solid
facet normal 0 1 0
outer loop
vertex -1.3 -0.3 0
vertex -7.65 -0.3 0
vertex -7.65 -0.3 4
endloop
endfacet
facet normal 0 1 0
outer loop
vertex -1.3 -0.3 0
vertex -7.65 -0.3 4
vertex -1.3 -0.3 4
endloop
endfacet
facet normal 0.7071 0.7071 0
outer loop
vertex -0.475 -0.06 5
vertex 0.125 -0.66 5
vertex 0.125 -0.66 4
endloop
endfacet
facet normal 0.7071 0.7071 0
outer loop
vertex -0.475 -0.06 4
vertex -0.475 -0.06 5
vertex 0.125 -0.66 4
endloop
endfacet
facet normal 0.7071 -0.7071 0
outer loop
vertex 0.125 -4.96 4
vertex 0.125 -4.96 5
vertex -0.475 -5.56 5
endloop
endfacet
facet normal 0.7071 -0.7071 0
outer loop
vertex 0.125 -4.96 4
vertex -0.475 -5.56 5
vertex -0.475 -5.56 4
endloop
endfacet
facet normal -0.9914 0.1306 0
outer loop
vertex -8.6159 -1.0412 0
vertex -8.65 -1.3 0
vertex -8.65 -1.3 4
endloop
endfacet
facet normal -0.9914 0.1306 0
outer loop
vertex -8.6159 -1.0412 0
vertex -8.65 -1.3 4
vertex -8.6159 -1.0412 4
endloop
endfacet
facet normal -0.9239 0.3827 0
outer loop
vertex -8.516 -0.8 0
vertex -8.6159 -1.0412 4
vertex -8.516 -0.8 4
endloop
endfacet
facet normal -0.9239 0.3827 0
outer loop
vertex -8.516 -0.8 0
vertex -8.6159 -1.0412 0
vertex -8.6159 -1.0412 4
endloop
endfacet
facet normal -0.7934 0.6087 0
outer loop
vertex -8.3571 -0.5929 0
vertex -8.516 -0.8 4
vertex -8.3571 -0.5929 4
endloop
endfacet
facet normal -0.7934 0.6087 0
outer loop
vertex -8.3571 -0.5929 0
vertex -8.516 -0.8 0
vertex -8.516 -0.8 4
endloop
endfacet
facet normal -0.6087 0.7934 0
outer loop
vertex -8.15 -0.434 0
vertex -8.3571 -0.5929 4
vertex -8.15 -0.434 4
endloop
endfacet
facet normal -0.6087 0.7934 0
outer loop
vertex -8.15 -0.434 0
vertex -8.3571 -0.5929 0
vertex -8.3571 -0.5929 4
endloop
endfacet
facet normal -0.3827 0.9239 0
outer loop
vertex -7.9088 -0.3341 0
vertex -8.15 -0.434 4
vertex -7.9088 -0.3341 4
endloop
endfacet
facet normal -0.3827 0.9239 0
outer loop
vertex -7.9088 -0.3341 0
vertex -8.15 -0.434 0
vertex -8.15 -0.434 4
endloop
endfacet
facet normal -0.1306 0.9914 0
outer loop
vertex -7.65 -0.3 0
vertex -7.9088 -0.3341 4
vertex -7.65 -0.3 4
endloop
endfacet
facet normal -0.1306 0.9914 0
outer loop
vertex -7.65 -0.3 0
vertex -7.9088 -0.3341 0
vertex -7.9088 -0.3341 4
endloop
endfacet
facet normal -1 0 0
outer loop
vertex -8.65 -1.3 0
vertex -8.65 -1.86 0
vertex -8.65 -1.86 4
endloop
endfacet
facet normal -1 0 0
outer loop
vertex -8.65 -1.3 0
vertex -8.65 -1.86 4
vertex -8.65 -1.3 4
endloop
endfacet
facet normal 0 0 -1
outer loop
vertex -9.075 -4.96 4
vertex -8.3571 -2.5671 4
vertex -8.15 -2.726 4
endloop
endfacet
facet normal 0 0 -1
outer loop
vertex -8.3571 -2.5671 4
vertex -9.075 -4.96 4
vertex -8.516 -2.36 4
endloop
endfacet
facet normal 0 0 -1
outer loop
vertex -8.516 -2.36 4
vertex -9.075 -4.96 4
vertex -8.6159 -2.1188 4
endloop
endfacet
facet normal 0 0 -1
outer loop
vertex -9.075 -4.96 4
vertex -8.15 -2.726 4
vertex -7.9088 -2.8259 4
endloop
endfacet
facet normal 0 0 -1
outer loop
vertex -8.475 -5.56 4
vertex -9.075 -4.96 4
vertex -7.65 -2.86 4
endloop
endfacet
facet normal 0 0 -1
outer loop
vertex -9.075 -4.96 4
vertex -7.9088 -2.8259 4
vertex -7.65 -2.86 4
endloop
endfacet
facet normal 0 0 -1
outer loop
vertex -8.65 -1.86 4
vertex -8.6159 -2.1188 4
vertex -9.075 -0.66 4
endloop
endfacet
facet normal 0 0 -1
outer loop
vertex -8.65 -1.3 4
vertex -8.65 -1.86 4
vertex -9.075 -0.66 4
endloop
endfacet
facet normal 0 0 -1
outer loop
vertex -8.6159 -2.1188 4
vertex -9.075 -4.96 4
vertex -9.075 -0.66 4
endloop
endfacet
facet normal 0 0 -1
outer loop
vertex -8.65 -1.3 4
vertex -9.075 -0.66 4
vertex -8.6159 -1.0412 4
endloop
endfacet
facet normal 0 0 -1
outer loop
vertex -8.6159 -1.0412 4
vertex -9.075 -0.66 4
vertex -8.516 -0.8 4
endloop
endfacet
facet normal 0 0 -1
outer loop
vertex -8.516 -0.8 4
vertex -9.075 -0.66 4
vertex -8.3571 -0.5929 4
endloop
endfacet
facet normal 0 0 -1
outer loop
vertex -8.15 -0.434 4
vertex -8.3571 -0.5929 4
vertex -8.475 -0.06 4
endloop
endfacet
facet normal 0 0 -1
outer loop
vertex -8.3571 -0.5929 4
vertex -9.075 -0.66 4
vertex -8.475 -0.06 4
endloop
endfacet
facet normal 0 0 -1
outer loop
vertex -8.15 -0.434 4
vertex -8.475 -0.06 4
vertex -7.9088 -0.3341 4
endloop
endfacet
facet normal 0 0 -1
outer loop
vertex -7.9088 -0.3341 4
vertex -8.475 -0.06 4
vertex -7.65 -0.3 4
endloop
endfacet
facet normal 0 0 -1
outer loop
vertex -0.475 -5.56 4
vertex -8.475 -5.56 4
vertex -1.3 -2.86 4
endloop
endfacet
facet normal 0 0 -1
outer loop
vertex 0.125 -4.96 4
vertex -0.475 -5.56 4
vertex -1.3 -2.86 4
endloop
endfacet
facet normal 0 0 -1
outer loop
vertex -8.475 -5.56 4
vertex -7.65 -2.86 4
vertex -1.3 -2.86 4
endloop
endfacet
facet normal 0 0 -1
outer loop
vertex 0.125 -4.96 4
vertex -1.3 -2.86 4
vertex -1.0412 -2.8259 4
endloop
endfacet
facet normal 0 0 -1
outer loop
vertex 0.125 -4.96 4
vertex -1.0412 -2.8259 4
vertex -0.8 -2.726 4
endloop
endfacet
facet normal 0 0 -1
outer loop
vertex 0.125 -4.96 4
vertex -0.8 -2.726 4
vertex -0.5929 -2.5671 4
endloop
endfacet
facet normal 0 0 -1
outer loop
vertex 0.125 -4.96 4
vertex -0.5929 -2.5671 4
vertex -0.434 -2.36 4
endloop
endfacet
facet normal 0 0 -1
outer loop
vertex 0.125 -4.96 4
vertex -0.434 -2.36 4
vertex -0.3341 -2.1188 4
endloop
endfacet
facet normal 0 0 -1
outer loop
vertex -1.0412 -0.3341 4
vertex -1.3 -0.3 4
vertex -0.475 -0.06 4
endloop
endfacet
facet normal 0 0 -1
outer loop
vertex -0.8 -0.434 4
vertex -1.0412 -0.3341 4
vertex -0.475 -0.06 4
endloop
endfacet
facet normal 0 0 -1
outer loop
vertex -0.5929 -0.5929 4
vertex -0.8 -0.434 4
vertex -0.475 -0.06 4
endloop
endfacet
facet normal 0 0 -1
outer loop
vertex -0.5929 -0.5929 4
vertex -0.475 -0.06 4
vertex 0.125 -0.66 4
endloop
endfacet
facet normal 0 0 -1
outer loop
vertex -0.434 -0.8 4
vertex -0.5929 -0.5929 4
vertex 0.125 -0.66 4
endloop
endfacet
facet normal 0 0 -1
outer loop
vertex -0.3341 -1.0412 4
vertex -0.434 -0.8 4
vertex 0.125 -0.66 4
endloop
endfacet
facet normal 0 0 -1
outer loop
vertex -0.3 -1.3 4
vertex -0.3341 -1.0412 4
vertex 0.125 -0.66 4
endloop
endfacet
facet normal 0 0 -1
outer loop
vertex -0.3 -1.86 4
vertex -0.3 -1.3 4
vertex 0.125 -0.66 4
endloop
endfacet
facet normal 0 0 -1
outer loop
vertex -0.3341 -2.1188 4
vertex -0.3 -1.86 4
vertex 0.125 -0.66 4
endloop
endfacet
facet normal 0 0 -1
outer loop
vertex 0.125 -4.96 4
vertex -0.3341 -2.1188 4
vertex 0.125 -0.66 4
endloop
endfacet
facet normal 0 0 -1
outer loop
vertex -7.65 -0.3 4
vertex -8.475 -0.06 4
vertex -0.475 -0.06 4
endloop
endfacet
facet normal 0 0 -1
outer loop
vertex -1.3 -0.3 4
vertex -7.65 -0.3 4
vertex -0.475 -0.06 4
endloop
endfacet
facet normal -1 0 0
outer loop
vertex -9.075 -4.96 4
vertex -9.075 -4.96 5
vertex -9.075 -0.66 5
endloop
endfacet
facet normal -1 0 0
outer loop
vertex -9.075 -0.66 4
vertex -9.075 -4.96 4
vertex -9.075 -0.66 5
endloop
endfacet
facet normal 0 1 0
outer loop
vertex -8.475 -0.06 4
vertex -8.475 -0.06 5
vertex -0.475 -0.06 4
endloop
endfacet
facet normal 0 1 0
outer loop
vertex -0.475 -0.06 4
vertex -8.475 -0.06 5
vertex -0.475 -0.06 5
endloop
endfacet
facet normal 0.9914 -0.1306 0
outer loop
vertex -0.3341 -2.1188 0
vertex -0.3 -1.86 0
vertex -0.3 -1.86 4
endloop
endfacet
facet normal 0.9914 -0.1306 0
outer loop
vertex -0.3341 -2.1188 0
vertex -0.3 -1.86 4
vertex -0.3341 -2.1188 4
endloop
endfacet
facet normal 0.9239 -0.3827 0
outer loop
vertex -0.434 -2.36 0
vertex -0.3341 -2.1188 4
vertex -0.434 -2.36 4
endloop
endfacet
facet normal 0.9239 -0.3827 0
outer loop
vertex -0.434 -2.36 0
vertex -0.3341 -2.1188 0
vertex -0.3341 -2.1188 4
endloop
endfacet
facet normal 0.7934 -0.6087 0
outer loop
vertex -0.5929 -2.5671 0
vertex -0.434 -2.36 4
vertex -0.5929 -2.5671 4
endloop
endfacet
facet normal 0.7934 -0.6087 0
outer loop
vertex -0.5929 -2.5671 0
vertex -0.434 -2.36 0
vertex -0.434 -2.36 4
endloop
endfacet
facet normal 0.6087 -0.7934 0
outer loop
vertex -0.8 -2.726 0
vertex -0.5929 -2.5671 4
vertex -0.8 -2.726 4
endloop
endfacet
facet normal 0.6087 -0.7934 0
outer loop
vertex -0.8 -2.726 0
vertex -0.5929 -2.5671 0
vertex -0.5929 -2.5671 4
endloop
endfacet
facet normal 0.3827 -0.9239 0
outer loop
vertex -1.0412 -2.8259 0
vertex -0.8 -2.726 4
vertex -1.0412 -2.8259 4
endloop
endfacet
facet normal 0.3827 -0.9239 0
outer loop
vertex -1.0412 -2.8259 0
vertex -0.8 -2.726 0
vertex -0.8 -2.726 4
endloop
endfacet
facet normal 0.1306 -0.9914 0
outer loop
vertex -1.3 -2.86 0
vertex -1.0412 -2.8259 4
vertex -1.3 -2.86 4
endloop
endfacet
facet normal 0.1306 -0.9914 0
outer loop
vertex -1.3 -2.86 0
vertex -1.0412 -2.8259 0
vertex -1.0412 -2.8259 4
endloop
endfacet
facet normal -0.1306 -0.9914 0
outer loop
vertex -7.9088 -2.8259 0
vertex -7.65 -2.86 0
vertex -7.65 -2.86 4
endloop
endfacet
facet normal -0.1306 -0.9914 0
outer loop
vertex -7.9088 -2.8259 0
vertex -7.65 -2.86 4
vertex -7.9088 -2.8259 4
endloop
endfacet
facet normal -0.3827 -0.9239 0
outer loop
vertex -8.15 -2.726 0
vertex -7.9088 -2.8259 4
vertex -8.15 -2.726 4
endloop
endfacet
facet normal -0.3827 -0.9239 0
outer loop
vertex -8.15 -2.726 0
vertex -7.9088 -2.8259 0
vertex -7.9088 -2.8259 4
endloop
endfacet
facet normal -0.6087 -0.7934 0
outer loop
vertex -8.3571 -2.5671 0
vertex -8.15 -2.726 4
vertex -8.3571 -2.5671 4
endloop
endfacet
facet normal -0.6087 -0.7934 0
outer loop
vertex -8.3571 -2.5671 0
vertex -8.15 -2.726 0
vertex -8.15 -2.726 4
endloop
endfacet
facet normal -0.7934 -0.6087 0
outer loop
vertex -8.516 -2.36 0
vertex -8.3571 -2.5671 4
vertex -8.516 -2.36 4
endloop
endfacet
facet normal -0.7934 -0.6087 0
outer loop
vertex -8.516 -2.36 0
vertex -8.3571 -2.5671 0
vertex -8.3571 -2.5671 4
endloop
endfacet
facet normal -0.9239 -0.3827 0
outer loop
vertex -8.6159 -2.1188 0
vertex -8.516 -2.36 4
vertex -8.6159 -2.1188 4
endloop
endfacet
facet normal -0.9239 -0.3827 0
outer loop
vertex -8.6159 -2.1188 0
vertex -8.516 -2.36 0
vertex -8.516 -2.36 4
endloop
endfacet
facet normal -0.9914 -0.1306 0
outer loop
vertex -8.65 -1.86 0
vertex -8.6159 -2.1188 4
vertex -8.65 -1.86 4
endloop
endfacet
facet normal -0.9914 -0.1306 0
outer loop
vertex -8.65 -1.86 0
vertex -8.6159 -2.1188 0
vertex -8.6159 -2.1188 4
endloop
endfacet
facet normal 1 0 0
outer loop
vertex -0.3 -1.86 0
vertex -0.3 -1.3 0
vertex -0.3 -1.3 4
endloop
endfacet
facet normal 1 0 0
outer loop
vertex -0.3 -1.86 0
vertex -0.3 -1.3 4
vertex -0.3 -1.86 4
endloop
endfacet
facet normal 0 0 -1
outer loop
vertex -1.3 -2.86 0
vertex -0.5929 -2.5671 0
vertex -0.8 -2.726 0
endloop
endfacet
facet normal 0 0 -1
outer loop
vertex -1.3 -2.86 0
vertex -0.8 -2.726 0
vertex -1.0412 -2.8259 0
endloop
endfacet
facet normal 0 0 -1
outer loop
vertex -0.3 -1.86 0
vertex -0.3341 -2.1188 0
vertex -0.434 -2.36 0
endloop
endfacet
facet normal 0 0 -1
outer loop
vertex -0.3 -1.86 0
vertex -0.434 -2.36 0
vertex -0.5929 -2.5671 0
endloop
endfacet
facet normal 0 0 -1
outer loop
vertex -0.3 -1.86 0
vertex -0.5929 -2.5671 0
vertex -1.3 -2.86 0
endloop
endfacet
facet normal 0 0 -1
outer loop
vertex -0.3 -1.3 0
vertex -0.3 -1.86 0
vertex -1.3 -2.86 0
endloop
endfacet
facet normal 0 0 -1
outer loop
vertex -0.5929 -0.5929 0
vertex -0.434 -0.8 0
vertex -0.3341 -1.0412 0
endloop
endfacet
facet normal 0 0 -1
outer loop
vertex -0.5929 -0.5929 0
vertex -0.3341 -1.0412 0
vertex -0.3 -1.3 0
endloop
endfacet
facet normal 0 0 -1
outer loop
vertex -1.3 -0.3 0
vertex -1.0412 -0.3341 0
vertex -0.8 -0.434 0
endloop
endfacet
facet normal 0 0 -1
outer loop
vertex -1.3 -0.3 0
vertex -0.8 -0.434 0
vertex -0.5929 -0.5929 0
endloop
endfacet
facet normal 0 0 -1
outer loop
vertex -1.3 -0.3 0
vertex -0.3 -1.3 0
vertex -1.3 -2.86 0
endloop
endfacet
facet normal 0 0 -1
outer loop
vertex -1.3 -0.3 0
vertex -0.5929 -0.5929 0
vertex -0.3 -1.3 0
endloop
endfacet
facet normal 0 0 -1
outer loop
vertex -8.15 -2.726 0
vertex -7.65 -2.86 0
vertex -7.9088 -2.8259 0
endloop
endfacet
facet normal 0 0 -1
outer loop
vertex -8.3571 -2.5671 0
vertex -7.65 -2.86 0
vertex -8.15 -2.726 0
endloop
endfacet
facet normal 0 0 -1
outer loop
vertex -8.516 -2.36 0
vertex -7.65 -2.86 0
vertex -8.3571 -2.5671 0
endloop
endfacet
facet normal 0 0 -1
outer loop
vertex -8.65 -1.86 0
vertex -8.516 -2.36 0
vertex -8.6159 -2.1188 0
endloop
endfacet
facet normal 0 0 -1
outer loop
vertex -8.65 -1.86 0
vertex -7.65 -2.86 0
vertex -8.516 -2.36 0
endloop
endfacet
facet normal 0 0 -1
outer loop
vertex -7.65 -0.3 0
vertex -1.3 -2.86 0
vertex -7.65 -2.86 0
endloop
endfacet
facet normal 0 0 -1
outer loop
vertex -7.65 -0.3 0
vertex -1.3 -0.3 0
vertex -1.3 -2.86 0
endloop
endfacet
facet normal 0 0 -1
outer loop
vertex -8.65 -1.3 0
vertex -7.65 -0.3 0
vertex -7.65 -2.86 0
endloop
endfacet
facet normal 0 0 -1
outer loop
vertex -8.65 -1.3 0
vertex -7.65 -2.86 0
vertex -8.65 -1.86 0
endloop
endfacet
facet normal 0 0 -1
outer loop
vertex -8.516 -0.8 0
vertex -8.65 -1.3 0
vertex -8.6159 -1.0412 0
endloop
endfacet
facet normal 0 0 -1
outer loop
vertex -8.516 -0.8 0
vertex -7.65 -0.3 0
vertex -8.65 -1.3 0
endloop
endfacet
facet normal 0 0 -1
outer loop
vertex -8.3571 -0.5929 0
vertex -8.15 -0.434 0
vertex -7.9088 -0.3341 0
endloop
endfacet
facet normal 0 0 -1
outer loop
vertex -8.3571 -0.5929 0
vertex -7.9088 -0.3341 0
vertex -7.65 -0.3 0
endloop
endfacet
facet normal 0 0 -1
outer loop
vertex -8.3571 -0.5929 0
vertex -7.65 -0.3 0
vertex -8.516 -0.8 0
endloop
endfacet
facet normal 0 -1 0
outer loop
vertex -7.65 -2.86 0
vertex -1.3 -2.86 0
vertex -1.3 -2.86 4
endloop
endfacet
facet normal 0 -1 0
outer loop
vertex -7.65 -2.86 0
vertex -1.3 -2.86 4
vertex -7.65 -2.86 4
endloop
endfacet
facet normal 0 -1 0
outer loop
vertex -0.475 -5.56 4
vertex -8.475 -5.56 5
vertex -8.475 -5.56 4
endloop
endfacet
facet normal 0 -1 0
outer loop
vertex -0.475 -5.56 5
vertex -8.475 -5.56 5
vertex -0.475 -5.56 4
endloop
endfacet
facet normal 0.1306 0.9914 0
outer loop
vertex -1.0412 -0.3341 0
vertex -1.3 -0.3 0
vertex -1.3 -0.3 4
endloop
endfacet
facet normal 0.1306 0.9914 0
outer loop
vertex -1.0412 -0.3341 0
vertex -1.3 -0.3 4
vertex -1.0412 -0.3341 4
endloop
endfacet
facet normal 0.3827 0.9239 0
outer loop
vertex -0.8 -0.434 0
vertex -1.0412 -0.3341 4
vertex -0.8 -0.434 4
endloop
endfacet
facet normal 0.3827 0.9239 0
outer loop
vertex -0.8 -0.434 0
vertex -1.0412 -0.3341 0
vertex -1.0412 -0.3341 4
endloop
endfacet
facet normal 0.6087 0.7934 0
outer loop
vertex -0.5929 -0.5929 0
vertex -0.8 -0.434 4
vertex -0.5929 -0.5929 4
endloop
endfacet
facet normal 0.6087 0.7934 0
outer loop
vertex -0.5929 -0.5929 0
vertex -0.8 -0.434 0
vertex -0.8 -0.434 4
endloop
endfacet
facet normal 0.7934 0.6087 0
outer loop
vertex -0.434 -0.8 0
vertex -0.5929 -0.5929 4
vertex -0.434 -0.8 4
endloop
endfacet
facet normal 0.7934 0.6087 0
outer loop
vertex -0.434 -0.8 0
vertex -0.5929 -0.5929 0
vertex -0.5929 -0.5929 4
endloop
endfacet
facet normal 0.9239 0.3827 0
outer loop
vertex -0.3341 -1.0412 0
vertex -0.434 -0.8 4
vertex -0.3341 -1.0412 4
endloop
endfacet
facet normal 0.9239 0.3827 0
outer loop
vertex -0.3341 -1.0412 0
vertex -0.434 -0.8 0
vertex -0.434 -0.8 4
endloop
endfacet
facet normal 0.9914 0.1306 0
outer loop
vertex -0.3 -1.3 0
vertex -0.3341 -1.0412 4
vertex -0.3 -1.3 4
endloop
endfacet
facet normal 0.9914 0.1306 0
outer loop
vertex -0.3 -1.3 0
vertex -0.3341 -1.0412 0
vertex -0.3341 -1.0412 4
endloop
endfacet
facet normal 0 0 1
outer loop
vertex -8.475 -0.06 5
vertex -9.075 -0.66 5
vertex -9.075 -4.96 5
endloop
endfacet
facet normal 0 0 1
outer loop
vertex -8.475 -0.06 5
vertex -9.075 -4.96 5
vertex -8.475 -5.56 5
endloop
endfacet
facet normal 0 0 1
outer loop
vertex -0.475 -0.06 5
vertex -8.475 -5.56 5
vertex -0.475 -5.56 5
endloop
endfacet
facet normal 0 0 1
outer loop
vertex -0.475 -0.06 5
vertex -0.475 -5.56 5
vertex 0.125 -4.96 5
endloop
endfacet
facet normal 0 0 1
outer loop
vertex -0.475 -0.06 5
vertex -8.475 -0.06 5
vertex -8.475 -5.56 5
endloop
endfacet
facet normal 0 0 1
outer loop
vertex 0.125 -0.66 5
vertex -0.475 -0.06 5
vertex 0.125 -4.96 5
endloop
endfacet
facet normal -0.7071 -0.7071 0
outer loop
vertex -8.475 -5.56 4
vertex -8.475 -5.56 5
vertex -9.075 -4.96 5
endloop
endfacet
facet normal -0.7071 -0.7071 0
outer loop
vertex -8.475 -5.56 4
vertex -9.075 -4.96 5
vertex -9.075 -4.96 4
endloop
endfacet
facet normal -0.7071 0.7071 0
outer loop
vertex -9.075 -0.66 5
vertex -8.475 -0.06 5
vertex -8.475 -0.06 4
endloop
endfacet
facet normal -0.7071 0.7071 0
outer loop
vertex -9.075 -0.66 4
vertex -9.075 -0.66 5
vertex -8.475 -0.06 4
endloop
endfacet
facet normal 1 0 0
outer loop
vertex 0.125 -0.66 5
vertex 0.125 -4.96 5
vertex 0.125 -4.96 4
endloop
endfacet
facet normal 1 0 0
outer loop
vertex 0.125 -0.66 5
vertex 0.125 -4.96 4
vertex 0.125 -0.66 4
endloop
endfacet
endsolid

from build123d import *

# Parameters (mm, degrees)
BOSS_EXTRUDE1_DEPTH = 5
SKETCH2_W           = 9.2
SKETCH2_H           = 5.5
BOSS_EXTRUDE2_DEPTH = 1
CHAMFER1_SIZE       = 0.6


with BuildPart() as part:
    # Sketch1 → Boss-Extrude1 (new body)
    with BuildSketch(Plane.XY):
        with BuildLine():
            Line((-4.17, -0.3), (-1.3, -0.3))
            ThreePointArc((-1.3, -0.3), (-0.592893219, -0.592893219), (-0.3, -1.3))
            Line((-0.3, -1.3), (-0.3, -1.86))
            ThreePointArc((-0.3, -1.86), (-0.592893219, -2.567106781), (-1.3, -2.86))
            Line((-1.3, -2.86), (-7.65, -2.86))
            ThreePointArc((-7.65, -2.86), (-8.357106781, -2.567106781), (-8.65, -1.86))
            Line((-8.65, -1.86), (-8.65, -1.3))
            ThreePointArc((-8.65, -1.3), (-8.357106781, -0.592893219), (-7.65, -0.3))
            Line((-7.65, -0.3), (-4.17, -0.3))
        make_face()
    extrude(amount=BOSS_EXTRUDE1_DEPTH)

    # Sketch2 → Boss-Extrude2 (add)
    with BuildSketch(Plane.XY.offset(5)):
        with Locations((-4.475, -2.81)):
            Rectangle(SKETCH2_W, SKETCH2_H)
    extrude(amount=-BOSS_EXTRUDE2_DEPTH)

    # Chamfer1
    chamfer1_edges = [part.edges().sort_by_distance(p)[0] for p in [
        (0.125, -0.06, 4.5),
        (0.125, -5.56, 4.5),
        (-9.075, -5.56, 4.5),
        (-9.075, -0.06, 4.5),
    ]]
    chamfer(chamfer1_edges, length=CHAMFER1_SIZE)


solid = part.part
